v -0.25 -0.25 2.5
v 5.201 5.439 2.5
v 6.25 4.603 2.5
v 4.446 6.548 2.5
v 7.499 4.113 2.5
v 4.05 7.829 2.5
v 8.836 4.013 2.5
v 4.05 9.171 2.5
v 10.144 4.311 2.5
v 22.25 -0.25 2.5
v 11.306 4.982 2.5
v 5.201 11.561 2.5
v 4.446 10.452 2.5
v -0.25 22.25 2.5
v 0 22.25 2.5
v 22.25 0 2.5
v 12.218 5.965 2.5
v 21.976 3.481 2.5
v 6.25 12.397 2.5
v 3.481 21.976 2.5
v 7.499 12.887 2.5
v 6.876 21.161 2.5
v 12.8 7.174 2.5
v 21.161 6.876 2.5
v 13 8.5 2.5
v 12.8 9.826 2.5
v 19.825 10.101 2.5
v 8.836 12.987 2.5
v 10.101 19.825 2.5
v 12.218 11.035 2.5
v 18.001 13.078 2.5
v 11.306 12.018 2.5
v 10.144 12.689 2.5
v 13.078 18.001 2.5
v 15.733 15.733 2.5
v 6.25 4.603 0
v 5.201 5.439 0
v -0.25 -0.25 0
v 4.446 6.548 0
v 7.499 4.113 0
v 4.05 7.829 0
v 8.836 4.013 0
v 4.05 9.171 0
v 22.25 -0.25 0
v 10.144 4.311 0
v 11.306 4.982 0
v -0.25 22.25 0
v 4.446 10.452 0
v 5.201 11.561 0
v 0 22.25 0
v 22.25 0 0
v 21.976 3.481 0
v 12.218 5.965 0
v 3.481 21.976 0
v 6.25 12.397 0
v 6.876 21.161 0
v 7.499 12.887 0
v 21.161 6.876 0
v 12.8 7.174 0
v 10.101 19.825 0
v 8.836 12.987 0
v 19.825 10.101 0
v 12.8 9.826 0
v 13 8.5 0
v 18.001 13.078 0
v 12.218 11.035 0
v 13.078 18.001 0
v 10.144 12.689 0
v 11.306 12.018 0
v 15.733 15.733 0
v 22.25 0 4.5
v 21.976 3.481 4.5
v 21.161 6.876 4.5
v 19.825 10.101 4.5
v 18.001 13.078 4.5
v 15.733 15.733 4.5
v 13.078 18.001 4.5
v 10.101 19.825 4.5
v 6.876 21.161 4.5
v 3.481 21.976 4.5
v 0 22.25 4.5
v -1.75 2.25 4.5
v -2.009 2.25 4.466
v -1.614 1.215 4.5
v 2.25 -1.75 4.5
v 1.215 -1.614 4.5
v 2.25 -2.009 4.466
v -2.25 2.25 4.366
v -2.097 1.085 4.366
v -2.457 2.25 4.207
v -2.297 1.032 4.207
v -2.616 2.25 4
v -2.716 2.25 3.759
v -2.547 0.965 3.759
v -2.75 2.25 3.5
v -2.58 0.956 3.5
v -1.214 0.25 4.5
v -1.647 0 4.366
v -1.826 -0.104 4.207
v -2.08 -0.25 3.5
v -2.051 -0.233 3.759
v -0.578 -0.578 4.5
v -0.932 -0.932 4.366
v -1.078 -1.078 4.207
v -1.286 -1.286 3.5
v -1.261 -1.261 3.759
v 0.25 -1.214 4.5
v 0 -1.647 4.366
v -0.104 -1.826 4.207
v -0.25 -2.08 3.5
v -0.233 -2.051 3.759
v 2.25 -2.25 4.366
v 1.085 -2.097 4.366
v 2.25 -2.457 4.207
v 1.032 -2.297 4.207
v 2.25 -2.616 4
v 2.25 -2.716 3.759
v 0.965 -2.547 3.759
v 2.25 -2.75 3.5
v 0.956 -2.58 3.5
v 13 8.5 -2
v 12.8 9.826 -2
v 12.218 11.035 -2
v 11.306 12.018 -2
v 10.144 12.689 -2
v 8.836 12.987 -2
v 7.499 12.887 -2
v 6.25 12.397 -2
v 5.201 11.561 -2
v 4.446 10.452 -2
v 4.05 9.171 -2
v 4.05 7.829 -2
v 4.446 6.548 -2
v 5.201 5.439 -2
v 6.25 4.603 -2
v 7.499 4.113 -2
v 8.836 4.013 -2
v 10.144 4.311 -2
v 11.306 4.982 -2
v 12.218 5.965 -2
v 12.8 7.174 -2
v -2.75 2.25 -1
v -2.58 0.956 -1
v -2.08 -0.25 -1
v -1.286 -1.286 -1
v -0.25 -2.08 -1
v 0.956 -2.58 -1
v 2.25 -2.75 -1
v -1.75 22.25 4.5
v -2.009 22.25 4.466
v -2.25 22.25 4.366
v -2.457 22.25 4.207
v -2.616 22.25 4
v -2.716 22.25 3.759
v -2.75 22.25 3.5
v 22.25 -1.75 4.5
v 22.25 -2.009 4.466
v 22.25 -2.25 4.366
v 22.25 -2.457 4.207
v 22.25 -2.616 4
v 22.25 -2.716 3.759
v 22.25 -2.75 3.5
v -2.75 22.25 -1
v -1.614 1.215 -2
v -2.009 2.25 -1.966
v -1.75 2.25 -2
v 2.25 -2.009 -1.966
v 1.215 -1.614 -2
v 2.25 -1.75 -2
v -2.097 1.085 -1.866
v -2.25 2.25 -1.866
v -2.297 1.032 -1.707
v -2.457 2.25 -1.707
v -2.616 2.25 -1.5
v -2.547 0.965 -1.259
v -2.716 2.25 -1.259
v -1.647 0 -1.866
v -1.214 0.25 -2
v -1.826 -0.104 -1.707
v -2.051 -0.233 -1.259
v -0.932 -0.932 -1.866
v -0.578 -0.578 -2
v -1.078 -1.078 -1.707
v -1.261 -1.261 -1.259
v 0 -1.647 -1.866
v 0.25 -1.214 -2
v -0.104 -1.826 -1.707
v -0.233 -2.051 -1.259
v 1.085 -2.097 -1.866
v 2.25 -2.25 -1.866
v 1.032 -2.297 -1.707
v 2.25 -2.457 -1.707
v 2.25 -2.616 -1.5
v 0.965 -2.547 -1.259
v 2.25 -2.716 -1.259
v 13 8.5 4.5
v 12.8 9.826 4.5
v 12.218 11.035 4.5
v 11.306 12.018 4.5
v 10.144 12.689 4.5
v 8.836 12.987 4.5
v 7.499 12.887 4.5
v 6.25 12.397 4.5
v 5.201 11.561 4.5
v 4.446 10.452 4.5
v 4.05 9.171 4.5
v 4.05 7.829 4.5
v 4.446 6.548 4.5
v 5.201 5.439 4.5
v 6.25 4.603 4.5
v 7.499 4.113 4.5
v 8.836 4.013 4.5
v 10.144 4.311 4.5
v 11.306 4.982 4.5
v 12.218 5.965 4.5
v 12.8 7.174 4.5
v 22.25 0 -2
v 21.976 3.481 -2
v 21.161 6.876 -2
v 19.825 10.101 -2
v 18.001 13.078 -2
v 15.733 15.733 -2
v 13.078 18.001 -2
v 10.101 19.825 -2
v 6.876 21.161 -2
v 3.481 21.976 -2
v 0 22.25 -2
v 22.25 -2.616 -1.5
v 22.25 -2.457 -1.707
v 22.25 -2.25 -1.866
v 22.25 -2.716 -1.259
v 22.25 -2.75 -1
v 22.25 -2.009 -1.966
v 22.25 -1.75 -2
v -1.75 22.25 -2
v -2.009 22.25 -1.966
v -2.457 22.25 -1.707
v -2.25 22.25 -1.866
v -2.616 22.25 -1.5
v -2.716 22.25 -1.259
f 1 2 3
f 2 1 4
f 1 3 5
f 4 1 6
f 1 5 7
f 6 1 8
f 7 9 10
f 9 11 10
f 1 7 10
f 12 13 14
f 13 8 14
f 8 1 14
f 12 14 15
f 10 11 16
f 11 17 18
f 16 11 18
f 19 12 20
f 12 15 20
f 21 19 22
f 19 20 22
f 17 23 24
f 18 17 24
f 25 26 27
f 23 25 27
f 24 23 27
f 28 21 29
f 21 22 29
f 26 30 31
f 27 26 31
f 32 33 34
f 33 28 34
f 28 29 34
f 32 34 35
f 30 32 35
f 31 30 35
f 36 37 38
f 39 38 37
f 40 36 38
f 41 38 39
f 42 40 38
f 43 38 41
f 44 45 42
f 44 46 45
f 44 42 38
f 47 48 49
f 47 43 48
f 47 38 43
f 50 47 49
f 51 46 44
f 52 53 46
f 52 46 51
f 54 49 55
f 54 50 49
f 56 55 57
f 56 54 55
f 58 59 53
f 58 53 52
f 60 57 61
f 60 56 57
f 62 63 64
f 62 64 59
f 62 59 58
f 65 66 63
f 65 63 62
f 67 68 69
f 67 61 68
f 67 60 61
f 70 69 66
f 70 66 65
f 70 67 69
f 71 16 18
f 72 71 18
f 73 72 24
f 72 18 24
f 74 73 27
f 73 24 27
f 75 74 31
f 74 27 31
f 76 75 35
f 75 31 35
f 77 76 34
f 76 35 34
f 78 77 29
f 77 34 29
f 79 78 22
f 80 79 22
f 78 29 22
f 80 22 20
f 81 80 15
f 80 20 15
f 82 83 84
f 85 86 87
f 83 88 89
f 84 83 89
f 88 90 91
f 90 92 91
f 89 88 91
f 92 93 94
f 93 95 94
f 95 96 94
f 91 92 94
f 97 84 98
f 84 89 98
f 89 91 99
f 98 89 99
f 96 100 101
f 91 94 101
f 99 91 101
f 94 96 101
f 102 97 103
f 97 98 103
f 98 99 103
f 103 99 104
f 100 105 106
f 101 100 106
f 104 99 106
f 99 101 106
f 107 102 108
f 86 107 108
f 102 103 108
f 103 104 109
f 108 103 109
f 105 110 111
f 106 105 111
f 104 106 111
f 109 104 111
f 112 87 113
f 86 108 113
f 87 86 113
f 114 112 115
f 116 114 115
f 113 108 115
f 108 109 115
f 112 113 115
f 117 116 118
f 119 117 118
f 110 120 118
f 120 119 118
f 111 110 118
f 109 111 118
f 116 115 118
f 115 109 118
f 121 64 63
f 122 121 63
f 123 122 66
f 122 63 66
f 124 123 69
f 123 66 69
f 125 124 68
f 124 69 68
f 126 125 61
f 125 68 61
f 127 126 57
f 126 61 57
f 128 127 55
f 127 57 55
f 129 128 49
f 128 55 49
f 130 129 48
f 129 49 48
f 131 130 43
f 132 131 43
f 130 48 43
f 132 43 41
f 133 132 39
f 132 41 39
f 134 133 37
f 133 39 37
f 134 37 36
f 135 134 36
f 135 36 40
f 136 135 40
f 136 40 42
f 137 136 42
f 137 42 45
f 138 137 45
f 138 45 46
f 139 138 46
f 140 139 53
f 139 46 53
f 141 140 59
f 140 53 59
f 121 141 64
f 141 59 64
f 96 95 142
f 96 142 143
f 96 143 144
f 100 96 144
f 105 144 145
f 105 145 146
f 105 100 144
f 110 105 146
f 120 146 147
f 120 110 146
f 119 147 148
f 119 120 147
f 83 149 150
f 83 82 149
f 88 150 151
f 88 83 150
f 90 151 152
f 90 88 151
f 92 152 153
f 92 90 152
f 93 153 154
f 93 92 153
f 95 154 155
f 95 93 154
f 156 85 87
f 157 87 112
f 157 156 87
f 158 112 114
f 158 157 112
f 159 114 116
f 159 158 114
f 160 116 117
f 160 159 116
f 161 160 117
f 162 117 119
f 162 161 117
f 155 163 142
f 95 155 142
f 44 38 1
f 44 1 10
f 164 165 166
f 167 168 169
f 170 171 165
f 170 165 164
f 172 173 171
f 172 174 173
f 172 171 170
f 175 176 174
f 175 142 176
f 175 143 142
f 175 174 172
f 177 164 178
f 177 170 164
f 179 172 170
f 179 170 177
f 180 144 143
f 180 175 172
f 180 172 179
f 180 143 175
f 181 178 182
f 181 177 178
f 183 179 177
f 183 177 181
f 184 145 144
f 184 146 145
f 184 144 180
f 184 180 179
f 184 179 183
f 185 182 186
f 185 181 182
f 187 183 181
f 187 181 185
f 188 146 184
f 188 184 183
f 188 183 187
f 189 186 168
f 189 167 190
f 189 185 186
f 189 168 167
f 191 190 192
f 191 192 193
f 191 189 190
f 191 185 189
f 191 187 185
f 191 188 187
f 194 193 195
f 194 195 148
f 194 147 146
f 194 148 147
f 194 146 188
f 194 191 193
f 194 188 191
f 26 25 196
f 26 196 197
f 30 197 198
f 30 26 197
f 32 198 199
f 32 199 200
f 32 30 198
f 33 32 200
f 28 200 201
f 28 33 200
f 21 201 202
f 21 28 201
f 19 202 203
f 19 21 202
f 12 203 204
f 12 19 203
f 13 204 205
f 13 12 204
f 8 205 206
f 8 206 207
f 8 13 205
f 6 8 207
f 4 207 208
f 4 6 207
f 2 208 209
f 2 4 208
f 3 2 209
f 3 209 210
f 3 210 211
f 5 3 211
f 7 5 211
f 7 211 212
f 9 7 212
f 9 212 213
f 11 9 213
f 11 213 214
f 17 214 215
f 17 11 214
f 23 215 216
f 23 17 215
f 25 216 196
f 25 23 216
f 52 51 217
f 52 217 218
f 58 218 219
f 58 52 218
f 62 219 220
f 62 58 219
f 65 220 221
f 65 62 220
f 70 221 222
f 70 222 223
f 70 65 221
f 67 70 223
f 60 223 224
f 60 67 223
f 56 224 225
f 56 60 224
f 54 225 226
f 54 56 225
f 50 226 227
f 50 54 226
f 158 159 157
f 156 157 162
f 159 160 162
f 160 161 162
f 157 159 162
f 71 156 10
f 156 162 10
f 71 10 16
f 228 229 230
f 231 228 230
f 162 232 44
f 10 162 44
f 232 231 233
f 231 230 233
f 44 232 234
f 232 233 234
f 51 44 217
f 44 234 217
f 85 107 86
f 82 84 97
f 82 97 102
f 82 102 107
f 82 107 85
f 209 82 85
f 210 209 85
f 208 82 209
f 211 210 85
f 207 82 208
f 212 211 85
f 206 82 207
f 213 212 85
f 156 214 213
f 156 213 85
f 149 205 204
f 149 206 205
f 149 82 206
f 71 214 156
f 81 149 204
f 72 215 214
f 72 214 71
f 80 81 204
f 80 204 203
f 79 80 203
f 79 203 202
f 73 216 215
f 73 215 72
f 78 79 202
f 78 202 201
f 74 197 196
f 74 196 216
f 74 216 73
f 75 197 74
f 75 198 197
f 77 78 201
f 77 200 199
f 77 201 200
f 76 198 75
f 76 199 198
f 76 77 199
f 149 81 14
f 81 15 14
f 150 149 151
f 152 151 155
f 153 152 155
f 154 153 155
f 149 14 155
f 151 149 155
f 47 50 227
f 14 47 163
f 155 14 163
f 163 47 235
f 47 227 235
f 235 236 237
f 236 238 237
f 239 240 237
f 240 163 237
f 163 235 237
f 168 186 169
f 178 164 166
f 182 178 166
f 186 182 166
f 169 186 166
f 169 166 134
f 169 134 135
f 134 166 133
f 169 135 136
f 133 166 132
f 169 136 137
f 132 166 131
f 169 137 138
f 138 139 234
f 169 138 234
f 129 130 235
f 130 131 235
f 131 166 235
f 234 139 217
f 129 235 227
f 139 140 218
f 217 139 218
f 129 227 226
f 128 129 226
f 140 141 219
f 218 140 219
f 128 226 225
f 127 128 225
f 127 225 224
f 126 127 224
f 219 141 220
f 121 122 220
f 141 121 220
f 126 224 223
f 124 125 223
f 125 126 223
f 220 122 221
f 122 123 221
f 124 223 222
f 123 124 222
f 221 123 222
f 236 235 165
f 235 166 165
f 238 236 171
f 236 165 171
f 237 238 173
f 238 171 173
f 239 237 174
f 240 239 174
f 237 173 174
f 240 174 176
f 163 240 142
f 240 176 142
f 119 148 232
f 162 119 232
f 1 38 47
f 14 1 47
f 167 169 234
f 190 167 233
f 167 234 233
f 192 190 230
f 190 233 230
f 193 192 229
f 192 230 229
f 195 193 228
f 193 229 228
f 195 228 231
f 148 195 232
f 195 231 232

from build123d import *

# Parameters (mm, degrees)
F0_W     = 2.5
F0_H     = 22.25
F0_R     = 4.5
F0_W_2   = 22.5
F0_H_2   = 2.5
F1_DEPTH = 2
F2_DEPTH = 2.5
F3_W     = 2.5
F3_H     = 22.5
F3_R     = 4.5
F3_H_2   = 2.5
F3_W_2   = 22.5
F4_DEPTH = 2
F5_R     = 5
F6_R     = 1


with BuildPart() as f1:
    # F0 (on Top) → F1 (new body)
    with BuildSketch(Plane.XY):
        Polygon((-0.25, -0.25), (-0.25, 0), (-2.75, 0), (-2.75, -2.75), (-0.25, -2.75), align=None)
        with Locations((-1.5, 11.125)):
            Rectangle(F0_W, F0_H)
        with BuildLine():
            Line((-0.25, 22.25), (-0.25, 0))
            Line((-0.25, 0), (-0.25, -0.25))
            Line((-0.25, -0.25), (22.25, -0.25))
            Line((22.25, -0.25), (22.25, 0))
            ThreePointArc((22.25, 0), (15.7331258814, 15.7331258814), (0, 22.25))
            Line((0, 22.25), (-0.25, 22.25))
        make_face()
        with Locations((8.5, 8.5)):
            Circle(F0_R, mode=Mode.SUBTRACT)
        with Locations((11, -1.5)):
            Rectangle(F0_W_2, F0_H_2)
    extrude(amount=-F1_DEPTH)

    # F0 (on Top) → F2 (join)
    with BuildSketch(Plane.XY):
        with Locations((-1.5, 11.125)):
            Rectangle(F0_W, F0_H)
        Polygon((-0.25, -0.25), (-0.25, 0), (-2.75, 0), (-2.75, -2.75), (-0.25, -2.75), align=None)
        with Locations((11, -1.5)):
            Rectangle(F0_W_2, F0_H_2)
    extrude(amount=F2_DEPTH)

    # F3 (on face) → F4 (join)
    with BuildSketch(Plane.XY.offset(2.5)):
        with Locations((-1.5, 11)):
            Rectangle(F3_W, F3_H)
        with BuildLine():
            Line((0, 22.25), (-0.25, 22.25))
            Line((-0.25, 22.25), (-0.25, -0.25))
            Line((-0.25, -0.25), (22.25, -0.25))
            Line((22.25, -0.25), (22.25, 0))
            ThreePointArc((22.25, 0), (15.7331258814, 15.7331258814), (0, 22.25))
        make_face()
        with Locations((8.5, 8.5)):
            Circle(F3_R, mode=Mode.SUBTRACT)
        with Locations((-1.5, -1.5)):
            Rectangle(F3_W, F3_H_2)
        with Locations((11, -1.5)):
            Rectangle(F3_W_2, F3_H_2)
    extrude(amount=F4_DEPTH)

    # F5
    f5_edges = [f1.edges().sort_by_distance(p)[0] for p in [
        (-2.75, -2.75, 1.25),
    ]]
    fillet(f5_edges, radius=F5_R)

    # F6
    f6_edges = [f1.edges().sort_by_distance(p)[0] for p in [
        (12.25, -2.75, 4.5),
        (12.25, -2.75, -2),
        (-1.285534, -1.285534, -2),
    ]]
    fillet(f6_edges, radius=F6_R)


solid = f1.part
